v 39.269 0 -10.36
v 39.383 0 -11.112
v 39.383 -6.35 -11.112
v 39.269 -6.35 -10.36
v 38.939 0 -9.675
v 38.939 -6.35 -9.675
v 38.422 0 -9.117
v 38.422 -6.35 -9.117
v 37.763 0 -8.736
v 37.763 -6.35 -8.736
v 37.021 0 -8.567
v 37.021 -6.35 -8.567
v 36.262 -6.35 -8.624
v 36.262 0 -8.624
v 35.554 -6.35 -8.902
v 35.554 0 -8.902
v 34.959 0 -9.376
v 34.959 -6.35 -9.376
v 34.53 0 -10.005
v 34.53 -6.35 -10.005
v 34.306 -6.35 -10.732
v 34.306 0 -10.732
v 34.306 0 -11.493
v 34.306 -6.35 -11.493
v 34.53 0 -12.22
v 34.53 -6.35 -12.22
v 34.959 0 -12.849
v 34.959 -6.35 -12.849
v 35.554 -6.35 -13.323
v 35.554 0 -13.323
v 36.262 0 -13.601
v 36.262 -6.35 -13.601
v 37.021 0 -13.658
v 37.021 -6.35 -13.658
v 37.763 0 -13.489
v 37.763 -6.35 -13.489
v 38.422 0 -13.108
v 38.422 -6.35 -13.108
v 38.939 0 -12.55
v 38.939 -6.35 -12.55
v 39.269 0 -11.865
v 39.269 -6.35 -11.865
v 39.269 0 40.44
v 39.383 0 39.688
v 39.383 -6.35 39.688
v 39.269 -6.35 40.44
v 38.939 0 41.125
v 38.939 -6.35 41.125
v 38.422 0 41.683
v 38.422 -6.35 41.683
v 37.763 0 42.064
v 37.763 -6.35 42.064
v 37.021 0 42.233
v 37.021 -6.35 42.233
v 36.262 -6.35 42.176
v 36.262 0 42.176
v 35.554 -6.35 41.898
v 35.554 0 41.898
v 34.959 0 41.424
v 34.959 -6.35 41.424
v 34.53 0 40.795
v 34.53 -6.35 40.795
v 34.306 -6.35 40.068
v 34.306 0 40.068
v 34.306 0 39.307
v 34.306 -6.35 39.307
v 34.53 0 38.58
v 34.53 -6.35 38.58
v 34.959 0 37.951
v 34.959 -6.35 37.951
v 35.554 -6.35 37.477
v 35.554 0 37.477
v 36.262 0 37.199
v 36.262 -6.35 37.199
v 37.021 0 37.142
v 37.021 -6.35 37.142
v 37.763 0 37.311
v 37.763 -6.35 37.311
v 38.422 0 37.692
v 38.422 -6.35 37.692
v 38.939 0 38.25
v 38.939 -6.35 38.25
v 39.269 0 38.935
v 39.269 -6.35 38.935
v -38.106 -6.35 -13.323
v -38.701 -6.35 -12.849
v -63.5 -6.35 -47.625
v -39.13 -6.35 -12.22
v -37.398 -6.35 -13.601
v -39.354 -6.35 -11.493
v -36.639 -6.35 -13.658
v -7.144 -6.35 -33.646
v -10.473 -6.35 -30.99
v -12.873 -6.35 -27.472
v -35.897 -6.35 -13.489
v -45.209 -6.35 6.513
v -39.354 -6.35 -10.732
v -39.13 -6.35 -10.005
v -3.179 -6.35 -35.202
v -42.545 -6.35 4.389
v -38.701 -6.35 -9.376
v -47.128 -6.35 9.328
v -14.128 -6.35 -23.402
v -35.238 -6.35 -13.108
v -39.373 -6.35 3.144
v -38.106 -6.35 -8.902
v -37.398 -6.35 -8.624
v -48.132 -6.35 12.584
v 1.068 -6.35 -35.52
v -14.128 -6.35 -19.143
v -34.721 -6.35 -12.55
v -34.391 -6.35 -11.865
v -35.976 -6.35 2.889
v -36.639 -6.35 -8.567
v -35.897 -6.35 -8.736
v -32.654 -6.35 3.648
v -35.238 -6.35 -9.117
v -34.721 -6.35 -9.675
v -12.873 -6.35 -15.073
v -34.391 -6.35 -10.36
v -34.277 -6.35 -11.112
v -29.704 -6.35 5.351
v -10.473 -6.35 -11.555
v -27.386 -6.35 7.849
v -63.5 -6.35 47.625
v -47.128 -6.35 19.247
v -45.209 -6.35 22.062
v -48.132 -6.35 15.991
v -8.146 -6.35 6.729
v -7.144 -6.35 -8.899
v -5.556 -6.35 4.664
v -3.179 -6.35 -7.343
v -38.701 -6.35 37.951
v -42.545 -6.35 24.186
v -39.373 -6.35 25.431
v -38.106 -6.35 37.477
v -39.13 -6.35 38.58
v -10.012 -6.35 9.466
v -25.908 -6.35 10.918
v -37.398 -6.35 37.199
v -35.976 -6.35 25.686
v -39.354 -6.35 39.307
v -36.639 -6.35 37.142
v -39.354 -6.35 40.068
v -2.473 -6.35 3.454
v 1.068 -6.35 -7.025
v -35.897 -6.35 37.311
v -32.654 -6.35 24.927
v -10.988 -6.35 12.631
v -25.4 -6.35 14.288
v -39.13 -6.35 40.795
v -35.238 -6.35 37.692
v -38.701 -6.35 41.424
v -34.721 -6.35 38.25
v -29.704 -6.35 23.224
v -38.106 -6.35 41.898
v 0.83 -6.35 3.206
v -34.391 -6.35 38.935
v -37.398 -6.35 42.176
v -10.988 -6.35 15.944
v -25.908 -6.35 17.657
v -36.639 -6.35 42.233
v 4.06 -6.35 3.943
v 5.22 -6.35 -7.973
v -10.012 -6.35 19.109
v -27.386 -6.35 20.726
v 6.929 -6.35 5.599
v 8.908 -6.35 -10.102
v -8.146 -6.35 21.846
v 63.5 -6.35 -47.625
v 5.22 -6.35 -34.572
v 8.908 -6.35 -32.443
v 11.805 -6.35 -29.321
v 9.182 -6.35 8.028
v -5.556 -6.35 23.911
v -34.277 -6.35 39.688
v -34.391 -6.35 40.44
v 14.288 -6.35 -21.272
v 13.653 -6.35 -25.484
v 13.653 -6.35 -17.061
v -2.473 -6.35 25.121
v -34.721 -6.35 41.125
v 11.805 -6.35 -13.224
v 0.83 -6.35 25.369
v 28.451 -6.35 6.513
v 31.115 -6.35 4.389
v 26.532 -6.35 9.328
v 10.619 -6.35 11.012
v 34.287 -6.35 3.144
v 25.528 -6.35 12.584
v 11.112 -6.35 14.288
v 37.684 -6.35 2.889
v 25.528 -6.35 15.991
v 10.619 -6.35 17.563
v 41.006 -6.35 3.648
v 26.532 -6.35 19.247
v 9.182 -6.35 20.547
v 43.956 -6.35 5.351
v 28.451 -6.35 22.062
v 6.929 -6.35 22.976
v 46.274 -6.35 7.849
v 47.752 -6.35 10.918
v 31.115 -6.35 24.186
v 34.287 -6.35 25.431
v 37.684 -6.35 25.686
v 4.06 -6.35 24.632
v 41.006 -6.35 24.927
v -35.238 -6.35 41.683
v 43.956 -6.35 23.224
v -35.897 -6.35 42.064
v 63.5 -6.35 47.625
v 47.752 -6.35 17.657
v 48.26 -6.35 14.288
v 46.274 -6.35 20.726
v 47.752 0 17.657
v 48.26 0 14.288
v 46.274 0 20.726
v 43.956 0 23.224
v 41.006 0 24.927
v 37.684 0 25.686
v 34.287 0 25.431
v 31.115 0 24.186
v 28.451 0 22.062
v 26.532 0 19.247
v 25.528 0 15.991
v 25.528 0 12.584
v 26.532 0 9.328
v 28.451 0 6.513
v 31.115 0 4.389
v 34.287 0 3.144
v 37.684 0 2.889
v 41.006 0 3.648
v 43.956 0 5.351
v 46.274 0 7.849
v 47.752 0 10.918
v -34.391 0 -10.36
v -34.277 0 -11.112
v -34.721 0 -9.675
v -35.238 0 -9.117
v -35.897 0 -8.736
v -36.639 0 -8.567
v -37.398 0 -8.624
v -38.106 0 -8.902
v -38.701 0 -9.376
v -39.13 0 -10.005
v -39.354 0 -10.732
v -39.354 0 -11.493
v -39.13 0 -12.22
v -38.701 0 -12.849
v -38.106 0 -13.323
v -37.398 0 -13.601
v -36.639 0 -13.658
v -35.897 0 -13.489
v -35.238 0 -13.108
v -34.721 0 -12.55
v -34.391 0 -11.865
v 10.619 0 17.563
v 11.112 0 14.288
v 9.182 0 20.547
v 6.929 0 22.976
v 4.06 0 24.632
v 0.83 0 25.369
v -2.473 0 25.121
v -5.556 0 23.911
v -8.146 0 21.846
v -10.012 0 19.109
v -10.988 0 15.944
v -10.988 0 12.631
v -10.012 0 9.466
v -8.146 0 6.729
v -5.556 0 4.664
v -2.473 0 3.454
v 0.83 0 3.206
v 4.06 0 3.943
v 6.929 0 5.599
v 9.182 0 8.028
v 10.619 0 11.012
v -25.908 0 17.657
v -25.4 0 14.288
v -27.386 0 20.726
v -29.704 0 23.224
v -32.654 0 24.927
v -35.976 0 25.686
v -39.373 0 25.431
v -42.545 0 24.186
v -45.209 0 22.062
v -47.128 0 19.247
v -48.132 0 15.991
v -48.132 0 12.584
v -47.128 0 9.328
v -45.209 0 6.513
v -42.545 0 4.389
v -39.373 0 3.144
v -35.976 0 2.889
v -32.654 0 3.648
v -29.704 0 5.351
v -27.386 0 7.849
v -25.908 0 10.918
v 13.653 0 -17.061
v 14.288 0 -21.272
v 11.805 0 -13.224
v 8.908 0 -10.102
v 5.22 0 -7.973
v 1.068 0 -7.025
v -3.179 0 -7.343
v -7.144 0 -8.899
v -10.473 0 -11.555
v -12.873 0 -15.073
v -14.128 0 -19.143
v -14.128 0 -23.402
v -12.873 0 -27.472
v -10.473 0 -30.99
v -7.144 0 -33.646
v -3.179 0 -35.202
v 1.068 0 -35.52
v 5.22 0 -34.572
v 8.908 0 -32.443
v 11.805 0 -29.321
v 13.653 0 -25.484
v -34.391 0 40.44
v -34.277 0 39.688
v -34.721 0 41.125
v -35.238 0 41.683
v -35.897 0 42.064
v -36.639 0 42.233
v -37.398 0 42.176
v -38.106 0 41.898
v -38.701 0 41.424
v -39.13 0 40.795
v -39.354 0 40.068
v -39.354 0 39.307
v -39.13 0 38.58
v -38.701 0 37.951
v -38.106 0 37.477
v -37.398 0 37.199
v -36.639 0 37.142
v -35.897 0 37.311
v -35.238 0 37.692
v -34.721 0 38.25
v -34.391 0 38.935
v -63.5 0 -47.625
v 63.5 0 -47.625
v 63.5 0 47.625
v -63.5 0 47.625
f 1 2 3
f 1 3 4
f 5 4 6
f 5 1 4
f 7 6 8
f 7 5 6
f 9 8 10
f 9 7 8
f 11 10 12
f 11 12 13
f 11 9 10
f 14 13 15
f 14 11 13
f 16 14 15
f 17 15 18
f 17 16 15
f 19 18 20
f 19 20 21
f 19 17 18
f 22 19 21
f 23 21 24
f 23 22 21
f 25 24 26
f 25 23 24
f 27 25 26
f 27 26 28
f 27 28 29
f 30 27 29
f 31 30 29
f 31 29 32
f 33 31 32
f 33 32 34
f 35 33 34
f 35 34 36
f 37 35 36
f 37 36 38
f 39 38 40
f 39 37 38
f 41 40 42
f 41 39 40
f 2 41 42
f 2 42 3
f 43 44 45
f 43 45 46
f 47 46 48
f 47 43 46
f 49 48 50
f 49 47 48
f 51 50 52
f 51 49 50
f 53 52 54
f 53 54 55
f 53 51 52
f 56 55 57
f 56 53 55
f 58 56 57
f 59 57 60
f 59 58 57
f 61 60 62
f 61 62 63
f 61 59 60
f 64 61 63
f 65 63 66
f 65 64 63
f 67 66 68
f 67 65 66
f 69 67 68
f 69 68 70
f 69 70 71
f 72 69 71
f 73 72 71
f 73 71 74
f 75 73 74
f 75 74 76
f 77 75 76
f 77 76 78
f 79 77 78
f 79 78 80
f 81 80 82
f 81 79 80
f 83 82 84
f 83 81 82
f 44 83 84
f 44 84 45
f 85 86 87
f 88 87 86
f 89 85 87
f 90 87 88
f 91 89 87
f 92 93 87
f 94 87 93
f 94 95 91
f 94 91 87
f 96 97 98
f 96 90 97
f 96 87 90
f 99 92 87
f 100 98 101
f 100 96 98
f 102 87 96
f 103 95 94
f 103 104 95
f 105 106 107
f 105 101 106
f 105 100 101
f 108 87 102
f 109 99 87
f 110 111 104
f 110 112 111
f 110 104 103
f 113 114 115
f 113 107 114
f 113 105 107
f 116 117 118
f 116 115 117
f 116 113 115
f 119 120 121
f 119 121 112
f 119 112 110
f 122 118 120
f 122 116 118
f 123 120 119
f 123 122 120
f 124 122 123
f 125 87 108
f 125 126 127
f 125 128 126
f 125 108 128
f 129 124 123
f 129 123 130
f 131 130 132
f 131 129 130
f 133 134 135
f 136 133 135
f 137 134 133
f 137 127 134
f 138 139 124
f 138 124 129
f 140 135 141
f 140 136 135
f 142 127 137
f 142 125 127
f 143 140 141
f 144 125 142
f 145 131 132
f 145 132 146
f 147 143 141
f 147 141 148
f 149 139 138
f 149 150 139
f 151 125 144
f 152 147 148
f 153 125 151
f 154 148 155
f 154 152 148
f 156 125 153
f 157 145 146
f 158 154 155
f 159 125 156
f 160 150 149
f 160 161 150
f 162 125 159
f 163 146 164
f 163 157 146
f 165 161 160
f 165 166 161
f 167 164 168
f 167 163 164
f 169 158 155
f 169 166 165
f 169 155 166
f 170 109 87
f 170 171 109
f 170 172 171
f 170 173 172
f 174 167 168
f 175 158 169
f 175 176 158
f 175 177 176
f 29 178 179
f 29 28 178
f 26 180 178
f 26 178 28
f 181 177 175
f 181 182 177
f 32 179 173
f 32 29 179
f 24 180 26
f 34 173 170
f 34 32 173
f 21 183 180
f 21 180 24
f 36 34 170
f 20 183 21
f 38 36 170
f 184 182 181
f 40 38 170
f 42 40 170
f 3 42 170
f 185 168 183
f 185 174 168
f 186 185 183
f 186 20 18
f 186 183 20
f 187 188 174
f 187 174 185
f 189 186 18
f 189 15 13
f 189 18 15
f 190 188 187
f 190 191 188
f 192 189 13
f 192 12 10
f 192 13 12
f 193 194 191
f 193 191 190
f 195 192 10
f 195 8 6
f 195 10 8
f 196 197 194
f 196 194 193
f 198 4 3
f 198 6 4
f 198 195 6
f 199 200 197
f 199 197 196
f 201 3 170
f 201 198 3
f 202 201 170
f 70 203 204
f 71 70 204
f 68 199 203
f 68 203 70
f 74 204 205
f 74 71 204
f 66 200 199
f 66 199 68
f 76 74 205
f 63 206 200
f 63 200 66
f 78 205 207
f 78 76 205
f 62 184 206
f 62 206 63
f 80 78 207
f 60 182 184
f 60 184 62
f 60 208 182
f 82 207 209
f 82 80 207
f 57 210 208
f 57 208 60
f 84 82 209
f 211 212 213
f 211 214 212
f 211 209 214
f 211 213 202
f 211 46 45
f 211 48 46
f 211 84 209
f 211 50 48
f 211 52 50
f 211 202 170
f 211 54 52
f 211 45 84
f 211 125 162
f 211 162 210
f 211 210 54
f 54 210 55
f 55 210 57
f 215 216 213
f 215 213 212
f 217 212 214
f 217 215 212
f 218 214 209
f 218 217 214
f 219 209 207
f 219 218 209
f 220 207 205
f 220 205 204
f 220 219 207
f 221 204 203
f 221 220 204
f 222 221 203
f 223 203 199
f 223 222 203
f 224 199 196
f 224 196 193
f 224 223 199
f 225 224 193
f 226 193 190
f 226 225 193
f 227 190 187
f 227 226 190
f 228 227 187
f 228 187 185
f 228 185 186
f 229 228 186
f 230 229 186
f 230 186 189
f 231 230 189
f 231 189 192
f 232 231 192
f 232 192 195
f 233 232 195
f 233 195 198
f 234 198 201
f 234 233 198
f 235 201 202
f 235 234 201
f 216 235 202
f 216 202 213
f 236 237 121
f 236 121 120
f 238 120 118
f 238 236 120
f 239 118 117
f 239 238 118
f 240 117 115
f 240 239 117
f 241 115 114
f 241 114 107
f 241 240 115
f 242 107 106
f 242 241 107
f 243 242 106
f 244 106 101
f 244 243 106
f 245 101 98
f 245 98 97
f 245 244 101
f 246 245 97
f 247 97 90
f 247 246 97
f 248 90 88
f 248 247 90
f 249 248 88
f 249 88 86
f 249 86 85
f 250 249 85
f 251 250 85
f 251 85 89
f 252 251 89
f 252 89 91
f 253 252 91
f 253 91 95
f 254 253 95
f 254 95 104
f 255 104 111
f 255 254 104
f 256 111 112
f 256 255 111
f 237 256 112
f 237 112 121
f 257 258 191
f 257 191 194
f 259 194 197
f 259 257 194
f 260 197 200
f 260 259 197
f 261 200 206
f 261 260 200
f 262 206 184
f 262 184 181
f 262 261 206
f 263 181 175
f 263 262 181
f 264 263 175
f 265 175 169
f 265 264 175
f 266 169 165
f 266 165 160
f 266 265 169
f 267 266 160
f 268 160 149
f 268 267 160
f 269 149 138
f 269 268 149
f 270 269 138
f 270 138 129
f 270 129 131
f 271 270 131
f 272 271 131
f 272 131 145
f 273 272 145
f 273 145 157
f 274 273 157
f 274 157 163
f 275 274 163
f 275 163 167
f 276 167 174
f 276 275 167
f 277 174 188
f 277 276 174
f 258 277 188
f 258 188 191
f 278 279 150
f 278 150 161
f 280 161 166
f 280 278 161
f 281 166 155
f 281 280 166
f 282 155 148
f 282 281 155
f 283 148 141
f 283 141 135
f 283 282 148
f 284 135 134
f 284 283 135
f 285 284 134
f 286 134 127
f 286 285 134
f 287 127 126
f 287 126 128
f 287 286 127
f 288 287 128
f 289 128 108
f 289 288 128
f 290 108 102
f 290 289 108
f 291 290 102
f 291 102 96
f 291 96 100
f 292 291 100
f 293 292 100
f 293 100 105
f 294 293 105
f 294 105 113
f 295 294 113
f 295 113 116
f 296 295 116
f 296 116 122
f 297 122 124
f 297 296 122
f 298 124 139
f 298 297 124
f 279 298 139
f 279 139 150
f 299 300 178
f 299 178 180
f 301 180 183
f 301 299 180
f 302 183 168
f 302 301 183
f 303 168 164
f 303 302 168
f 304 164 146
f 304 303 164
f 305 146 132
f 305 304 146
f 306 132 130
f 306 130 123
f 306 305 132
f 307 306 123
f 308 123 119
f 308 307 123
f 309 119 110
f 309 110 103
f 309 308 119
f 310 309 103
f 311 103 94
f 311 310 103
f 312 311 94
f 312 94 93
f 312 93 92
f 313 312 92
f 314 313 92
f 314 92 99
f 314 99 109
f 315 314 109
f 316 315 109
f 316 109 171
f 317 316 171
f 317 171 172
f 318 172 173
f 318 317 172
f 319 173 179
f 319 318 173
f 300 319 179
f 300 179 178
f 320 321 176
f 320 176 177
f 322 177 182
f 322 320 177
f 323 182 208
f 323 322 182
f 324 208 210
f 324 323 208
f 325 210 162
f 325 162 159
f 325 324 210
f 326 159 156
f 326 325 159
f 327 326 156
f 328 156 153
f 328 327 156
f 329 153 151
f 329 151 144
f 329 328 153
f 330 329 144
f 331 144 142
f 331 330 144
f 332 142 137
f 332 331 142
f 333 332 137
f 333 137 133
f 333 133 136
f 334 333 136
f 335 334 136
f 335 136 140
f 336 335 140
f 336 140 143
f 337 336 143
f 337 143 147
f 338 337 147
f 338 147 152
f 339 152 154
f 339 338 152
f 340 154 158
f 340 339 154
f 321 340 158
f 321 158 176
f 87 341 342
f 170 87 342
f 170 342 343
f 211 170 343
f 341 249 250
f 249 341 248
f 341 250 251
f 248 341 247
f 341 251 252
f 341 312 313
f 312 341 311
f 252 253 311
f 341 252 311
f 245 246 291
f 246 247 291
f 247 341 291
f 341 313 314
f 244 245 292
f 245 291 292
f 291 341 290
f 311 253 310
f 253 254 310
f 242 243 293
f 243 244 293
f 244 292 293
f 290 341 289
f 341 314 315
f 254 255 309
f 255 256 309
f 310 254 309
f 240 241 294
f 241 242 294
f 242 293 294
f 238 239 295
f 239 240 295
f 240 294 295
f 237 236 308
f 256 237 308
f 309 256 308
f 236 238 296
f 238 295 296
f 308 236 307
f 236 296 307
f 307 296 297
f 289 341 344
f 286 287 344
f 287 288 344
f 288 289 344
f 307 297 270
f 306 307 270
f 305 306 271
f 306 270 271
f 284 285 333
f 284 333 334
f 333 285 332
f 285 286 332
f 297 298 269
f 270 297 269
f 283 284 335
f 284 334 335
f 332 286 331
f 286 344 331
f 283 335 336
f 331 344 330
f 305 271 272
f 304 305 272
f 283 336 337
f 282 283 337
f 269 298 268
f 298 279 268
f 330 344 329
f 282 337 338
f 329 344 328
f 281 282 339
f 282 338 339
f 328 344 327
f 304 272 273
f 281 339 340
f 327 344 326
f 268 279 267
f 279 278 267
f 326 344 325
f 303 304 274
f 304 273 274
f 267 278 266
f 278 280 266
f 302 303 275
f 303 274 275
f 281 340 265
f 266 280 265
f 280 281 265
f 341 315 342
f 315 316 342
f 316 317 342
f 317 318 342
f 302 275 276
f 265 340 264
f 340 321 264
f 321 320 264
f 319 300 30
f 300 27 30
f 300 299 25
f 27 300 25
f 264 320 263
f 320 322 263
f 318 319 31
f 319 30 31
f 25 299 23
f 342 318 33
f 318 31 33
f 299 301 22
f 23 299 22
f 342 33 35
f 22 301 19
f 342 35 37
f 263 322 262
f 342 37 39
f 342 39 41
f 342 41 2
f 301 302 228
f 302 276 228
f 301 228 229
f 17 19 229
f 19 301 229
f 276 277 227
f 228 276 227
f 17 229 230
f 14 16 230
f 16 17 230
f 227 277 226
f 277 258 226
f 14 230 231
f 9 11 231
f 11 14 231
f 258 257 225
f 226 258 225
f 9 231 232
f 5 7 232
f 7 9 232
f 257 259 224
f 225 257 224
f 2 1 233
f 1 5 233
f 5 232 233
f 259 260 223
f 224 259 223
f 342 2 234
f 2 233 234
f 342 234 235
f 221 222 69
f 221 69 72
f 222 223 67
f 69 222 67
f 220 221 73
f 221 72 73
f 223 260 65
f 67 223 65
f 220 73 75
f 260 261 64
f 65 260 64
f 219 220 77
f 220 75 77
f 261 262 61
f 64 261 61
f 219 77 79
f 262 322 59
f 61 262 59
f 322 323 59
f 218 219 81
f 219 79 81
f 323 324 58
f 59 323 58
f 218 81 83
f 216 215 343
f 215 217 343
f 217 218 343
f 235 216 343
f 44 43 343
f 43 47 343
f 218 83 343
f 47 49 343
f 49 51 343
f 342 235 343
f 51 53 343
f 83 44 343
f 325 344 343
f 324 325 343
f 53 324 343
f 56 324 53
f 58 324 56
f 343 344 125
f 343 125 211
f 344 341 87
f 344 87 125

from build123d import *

# Parameters (mm, degrees)
F0_W     = 127
F0_H     = 95.25
F0_R     = 2.5527
F0_R_2   = 14.2875
F0_R_3   = 11.43
F0_R_4   = 11.1125
F1_DEPTH = 6.35


with BuildPart() as f1:
    # F0 (on Front) → F1 (new body)
    with BuildSketch(Plane.XZ):
        Rectangle(F0_W, F0_H)
        with Locations((-36.83, -11.1125)):
            Circle(F0_R, mode=Mode.SUBTRACT)
        with Locations((0, -21.2725)):
            Circle(F0_R_2, mode=Mode.SUBTRACT)
        with Locations((36.83, -11.1125)):
            Circle(F0_R, mode=Mode.SUBTRACT)
        with Locations((-36.83, 14.2875)):
            Circle(F0_R_3, mode=Mode.SUBTRACT)
        with Locations((-36.83, 39.6875)):
            Circle(F0_R, mode=Mode.SUBTRACT)
        with Locations((0, 14.2875)):
            Circle(F0_R_4, mode=Mode.SUBTRACT)
        with Locations((36.83, 14.2875)):
            Circle(F0_R_3, mode=Mode.SUBTRACT)
        with Locations((36.83, 39.6875)):
            Circle(F0_R, mode=Mode.SUBTRACT)
    extrude(amount=F1_DEPTH)


solid = f1.part
